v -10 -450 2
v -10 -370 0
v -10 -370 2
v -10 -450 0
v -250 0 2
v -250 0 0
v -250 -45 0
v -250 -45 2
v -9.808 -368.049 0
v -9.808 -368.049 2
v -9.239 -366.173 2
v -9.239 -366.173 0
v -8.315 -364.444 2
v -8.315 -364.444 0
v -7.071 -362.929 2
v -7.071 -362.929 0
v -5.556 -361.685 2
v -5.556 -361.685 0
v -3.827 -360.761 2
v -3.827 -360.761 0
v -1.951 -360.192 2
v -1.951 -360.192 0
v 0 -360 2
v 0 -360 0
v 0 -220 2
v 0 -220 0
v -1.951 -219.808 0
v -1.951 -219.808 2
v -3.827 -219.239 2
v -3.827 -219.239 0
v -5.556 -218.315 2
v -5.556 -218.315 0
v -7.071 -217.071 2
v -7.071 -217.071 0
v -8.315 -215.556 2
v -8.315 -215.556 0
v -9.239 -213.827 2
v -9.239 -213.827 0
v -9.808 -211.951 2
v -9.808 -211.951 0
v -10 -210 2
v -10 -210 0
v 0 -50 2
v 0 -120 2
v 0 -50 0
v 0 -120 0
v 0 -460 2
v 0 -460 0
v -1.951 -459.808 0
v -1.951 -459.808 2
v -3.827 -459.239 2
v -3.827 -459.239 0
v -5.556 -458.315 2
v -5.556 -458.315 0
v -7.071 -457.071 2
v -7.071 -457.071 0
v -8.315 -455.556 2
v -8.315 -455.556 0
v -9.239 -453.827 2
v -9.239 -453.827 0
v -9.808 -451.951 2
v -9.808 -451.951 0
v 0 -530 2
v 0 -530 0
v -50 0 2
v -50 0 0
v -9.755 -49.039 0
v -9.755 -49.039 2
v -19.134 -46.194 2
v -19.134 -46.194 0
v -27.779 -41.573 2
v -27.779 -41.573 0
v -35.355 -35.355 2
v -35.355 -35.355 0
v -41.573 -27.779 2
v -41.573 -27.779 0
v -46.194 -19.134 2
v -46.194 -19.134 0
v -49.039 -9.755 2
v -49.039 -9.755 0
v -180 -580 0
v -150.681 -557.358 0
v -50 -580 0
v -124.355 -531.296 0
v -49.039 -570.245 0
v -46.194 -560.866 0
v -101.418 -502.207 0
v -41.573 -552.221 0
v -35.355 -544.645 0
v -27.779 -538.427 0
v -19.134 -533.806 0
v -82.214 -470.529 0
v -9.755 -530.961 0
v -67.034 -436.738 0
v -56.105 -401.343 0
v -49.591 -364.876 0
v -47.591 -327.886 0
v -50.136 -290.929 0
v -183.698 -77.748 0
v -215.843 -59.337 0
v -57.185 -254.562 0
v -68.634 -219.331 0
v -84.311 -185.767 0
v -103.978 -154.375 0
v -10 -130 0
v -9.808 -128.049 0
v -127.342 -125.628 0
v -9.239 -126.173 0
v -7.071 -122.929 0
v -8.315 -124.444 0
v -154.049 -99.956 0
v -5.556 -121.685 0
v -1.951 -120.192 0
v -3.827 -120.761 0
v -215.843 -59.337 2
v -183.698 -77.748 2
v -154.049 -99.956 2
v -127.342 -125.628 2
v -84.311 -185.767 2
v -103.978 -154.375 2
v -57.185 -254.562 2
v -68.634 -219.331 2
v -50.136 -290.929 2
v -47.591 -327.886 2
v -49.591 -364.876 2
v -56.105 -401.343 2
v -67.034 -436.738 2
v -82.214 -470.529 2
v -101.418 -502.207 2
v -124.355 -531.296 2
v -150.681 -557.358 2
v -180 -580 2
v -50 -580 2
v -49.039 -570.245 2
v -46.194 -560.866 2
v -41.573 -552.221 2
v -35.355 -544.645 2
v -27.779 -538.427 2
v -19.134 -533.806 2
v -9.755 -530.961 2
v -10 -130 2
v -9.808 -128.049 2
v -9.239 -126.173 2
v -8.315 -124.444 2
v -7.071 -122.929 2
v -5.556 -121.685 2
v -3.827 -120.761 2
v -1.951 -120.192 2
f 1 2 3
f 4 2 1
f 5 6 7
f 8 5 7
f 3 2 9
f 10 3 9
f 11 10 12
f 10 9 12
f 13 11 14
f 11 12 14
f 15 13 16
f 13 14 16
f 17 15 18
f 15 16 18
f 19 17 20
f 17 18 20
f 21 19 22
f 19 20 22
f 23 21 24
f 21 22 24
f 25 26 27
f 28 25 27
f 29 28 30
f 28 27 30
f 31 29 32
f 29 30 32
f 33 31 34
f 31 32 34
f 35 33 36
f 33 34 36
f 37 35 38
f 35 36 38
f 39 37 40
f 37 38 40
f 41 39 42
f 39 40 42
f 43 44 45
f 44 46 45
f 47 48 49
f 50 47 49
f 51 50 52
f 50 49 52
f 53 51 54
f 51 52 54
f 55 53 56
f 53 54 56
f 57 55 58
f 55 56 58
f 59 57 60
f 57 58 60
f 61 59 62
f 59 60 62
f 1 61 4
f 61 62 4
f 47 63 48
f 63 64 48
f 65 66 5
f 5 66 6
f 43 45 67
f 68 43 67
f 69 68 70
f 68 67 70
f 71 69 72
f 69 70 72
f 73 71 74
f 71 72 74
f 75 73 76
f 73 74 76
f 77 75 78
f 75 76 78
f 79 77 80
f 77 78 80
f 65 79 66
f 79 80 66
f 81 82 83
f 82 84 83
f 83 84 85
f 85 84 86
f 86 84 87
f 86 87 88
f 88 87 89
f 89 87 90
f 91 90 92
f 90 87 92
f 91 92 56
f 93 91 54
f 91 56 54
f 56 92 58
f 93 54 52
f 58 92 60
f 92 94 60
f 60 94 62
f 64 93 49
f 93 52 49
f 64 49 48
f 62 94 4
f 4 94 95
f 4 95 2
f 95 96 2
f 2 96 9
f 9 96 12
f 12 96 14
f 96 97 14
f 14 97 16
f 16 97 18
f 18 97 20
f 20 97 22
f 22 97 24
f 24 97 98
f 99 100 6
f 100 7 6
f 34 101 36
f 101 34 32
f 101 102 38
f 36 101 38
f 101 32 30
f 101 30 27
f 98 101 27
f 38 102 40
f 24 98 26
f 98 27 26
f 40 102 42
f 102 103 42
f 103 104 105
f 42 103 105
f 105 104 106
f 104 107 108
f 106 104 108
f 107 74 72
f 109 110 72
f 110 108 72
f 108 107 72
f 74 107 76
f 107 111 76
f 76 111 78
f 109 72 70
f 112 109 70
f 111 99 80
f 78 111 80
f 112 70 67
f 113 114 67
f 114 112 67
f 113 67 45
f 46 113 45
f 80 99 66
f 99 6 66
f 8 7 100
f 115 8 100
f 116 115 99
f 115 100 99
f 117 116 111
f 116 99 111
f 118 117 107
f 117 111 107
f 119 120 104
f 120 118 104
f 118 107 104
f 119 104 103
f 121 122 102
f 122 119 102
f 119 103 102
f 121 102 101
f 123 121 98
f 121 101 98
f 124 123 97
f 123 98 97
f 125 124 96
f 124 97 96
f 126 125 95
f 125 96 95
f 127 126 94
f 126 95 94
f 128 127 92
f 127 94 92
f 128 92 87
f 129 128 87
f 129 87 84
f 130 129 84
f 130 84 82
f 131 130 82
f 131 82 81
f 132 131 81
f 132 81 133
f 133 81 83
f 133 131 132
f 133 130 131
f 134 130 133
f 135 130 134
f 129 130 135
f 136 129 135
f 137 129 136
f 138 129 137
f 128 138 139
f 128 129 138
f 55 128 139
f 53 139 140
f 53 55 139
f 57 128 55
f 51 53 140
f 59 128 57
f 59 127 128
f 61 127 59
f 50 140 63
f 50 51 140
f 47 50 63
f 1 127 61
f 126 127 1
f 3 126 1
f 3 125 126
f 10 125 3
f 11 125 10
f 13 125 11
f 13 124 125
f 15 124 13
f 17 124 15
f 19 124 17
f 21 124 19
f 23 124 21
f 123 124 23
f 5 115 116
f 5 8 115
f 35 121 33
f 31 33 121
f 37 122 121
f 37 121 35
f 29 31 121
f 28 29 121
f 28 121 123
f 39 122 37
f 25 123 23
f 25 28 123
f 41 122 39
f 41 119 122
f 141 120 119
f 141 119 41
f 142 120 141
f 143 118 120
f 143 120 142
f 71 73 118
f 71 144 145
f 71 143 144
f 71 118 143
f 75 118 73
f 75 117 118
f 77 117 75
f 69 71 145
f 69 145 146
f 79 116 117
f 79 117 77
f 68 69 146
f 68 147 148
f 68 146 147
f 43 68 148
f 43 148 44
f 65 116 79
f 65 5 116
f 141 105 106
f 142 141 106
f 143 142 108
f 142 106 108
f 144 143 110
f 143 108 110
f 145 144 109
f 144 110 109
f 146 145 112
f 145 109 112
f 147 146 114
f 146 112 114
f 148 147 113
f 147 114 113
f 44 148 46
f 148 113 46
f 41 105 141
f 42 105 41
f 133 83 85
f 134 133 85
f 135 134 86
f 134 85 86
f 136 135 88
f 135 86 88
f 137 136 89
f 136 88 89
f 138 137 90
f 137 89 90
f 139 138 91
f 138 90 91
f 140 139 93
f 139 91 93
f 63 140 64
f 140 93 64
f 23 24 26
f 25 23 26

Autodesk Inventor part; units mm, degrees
ref_plane "YZ Plane" through (0, 0, 0) normal (1, 0, 0) x (0, 1, 0)
ref_plane "XZ Plane" through (0, 0, 0) normal (0, 1, 0) x (-1, 0, 0)
ref_plane "XY Plane" through (0, 0, 0) normal (0, 0, 1) x (1, 0, 0)
sketch "Sketch1" plane through (0, 0, 0) normal (0, 0, 1) x (1, 0, 0)
  line L0 (-250, -580) -> (0, -580)
  line L1 (0, -580) -> (0, 0)
  line L2 (0, 0) -> (-250, 0)
  line L3 (-250, 0) -> (-250, -580)
  line L4 (-250, -580) -> (0, 0) construction
  line L5 (0, -580) -> (-250, 0) construction
  arc A0 (-180, -580) -> (-250, -45) centre (-349.5833, -330.109) ccw
  circle A1 centre (0, -580) radius 50
  circle A2 centre (0, 0) radius 50
  line L6 (0, -130) -> (0, -210) construction
  line L7 (-10, -130) -> (-10, -210)
  line L8 (10, -210) -> (10, -130)
  arc A3 (10, -130) -> (-10, -130) centre (0, -130) ccw
  arc A4 (-10, -210) -> (10, -210) centre (0, -210) ccw
  line L9 (0, -370) -> (0, -450) construction
  line L10 (-10, -370) -> (-10, -450)
  line L11 (10, -450) -> (10, -370)
  arc A5 (10, -370) -> (-10, -370) centre (0, -370) ccw
  arc A6 (-10, -450) -> (10, -450) centre (0, -450) ccw
  point P0 (0, -170)
  point P1 (0, -410)
  point P2 (0, -120)
  point P3 (0, -50)
  point P4 (-50, 0)
  point P5 (-50, -580)
  point P6 (0, -530)
  point P7 (0, -460)
  point P8 (0, -360)
  point P9 (0, -220)
  dimension "d22" = 580
  dimension "d23" = 250
  dimension "d24" = 302
  dimension "d25" = 45
  dimension "d26" = 180
  dimension "d28" = 100
  dimension "d29" = 20
  dimension "d30" = 80
  dimension "d31" = 170
  dimension "d32" = 170
extrude "Plate1" add sketch "Sketch1" along normal blind 2 contours A0 L3 L2 A2 L1 A3 L7 A4 A5 L10 A6 A1 L0
sketch "Sketch2" plane through (0, 0, 0) normal (0, 0, -1) x (-1, 0, 0)
  line L0 (20, -20) -> (220, -20) construction
  line L1 (220, -20) -> (220, -40) construction
  line L2 (220, -40) -> (20, -40) construction
  line L3 (20, -40) -> (20, -20) construction
  line L4 (50, 0) -> (250, 0) projected
  line L5 (0, -120) -> (0, -50) projected
  point P0 (0, 0)
  point P1 (0, -580)
  point P2 (0, 0)
  dimension "d6" = 200
  dimension "d9" = 20
  dimension "d10" = 20
  dimension "d11" = 20
mark "Mark1"
equation "\"d2\" = Thickness"
equation "\"d32\" = d31"
equation "\"BendReliefWidth\" = Thickness"
equation "\"BendReliefDepth\" = 0.5 * Thickness"
equation "\"CornerReliefSize\" = 4 * Thickness"
equation "\"MinimumRemnant\" = 2 * Thickness"
equation "\"TransitionRadius\" = BendRadius"
equation "\"JacobiRadiusSize\" = BendRadius"
equation "\"GapSize\" = Thickness"
equation "\"Thickness\" = 2"
equation "\"BendRadius\" = 2.75"
properties part number "TRM 013 top main" material "AISI 304"
